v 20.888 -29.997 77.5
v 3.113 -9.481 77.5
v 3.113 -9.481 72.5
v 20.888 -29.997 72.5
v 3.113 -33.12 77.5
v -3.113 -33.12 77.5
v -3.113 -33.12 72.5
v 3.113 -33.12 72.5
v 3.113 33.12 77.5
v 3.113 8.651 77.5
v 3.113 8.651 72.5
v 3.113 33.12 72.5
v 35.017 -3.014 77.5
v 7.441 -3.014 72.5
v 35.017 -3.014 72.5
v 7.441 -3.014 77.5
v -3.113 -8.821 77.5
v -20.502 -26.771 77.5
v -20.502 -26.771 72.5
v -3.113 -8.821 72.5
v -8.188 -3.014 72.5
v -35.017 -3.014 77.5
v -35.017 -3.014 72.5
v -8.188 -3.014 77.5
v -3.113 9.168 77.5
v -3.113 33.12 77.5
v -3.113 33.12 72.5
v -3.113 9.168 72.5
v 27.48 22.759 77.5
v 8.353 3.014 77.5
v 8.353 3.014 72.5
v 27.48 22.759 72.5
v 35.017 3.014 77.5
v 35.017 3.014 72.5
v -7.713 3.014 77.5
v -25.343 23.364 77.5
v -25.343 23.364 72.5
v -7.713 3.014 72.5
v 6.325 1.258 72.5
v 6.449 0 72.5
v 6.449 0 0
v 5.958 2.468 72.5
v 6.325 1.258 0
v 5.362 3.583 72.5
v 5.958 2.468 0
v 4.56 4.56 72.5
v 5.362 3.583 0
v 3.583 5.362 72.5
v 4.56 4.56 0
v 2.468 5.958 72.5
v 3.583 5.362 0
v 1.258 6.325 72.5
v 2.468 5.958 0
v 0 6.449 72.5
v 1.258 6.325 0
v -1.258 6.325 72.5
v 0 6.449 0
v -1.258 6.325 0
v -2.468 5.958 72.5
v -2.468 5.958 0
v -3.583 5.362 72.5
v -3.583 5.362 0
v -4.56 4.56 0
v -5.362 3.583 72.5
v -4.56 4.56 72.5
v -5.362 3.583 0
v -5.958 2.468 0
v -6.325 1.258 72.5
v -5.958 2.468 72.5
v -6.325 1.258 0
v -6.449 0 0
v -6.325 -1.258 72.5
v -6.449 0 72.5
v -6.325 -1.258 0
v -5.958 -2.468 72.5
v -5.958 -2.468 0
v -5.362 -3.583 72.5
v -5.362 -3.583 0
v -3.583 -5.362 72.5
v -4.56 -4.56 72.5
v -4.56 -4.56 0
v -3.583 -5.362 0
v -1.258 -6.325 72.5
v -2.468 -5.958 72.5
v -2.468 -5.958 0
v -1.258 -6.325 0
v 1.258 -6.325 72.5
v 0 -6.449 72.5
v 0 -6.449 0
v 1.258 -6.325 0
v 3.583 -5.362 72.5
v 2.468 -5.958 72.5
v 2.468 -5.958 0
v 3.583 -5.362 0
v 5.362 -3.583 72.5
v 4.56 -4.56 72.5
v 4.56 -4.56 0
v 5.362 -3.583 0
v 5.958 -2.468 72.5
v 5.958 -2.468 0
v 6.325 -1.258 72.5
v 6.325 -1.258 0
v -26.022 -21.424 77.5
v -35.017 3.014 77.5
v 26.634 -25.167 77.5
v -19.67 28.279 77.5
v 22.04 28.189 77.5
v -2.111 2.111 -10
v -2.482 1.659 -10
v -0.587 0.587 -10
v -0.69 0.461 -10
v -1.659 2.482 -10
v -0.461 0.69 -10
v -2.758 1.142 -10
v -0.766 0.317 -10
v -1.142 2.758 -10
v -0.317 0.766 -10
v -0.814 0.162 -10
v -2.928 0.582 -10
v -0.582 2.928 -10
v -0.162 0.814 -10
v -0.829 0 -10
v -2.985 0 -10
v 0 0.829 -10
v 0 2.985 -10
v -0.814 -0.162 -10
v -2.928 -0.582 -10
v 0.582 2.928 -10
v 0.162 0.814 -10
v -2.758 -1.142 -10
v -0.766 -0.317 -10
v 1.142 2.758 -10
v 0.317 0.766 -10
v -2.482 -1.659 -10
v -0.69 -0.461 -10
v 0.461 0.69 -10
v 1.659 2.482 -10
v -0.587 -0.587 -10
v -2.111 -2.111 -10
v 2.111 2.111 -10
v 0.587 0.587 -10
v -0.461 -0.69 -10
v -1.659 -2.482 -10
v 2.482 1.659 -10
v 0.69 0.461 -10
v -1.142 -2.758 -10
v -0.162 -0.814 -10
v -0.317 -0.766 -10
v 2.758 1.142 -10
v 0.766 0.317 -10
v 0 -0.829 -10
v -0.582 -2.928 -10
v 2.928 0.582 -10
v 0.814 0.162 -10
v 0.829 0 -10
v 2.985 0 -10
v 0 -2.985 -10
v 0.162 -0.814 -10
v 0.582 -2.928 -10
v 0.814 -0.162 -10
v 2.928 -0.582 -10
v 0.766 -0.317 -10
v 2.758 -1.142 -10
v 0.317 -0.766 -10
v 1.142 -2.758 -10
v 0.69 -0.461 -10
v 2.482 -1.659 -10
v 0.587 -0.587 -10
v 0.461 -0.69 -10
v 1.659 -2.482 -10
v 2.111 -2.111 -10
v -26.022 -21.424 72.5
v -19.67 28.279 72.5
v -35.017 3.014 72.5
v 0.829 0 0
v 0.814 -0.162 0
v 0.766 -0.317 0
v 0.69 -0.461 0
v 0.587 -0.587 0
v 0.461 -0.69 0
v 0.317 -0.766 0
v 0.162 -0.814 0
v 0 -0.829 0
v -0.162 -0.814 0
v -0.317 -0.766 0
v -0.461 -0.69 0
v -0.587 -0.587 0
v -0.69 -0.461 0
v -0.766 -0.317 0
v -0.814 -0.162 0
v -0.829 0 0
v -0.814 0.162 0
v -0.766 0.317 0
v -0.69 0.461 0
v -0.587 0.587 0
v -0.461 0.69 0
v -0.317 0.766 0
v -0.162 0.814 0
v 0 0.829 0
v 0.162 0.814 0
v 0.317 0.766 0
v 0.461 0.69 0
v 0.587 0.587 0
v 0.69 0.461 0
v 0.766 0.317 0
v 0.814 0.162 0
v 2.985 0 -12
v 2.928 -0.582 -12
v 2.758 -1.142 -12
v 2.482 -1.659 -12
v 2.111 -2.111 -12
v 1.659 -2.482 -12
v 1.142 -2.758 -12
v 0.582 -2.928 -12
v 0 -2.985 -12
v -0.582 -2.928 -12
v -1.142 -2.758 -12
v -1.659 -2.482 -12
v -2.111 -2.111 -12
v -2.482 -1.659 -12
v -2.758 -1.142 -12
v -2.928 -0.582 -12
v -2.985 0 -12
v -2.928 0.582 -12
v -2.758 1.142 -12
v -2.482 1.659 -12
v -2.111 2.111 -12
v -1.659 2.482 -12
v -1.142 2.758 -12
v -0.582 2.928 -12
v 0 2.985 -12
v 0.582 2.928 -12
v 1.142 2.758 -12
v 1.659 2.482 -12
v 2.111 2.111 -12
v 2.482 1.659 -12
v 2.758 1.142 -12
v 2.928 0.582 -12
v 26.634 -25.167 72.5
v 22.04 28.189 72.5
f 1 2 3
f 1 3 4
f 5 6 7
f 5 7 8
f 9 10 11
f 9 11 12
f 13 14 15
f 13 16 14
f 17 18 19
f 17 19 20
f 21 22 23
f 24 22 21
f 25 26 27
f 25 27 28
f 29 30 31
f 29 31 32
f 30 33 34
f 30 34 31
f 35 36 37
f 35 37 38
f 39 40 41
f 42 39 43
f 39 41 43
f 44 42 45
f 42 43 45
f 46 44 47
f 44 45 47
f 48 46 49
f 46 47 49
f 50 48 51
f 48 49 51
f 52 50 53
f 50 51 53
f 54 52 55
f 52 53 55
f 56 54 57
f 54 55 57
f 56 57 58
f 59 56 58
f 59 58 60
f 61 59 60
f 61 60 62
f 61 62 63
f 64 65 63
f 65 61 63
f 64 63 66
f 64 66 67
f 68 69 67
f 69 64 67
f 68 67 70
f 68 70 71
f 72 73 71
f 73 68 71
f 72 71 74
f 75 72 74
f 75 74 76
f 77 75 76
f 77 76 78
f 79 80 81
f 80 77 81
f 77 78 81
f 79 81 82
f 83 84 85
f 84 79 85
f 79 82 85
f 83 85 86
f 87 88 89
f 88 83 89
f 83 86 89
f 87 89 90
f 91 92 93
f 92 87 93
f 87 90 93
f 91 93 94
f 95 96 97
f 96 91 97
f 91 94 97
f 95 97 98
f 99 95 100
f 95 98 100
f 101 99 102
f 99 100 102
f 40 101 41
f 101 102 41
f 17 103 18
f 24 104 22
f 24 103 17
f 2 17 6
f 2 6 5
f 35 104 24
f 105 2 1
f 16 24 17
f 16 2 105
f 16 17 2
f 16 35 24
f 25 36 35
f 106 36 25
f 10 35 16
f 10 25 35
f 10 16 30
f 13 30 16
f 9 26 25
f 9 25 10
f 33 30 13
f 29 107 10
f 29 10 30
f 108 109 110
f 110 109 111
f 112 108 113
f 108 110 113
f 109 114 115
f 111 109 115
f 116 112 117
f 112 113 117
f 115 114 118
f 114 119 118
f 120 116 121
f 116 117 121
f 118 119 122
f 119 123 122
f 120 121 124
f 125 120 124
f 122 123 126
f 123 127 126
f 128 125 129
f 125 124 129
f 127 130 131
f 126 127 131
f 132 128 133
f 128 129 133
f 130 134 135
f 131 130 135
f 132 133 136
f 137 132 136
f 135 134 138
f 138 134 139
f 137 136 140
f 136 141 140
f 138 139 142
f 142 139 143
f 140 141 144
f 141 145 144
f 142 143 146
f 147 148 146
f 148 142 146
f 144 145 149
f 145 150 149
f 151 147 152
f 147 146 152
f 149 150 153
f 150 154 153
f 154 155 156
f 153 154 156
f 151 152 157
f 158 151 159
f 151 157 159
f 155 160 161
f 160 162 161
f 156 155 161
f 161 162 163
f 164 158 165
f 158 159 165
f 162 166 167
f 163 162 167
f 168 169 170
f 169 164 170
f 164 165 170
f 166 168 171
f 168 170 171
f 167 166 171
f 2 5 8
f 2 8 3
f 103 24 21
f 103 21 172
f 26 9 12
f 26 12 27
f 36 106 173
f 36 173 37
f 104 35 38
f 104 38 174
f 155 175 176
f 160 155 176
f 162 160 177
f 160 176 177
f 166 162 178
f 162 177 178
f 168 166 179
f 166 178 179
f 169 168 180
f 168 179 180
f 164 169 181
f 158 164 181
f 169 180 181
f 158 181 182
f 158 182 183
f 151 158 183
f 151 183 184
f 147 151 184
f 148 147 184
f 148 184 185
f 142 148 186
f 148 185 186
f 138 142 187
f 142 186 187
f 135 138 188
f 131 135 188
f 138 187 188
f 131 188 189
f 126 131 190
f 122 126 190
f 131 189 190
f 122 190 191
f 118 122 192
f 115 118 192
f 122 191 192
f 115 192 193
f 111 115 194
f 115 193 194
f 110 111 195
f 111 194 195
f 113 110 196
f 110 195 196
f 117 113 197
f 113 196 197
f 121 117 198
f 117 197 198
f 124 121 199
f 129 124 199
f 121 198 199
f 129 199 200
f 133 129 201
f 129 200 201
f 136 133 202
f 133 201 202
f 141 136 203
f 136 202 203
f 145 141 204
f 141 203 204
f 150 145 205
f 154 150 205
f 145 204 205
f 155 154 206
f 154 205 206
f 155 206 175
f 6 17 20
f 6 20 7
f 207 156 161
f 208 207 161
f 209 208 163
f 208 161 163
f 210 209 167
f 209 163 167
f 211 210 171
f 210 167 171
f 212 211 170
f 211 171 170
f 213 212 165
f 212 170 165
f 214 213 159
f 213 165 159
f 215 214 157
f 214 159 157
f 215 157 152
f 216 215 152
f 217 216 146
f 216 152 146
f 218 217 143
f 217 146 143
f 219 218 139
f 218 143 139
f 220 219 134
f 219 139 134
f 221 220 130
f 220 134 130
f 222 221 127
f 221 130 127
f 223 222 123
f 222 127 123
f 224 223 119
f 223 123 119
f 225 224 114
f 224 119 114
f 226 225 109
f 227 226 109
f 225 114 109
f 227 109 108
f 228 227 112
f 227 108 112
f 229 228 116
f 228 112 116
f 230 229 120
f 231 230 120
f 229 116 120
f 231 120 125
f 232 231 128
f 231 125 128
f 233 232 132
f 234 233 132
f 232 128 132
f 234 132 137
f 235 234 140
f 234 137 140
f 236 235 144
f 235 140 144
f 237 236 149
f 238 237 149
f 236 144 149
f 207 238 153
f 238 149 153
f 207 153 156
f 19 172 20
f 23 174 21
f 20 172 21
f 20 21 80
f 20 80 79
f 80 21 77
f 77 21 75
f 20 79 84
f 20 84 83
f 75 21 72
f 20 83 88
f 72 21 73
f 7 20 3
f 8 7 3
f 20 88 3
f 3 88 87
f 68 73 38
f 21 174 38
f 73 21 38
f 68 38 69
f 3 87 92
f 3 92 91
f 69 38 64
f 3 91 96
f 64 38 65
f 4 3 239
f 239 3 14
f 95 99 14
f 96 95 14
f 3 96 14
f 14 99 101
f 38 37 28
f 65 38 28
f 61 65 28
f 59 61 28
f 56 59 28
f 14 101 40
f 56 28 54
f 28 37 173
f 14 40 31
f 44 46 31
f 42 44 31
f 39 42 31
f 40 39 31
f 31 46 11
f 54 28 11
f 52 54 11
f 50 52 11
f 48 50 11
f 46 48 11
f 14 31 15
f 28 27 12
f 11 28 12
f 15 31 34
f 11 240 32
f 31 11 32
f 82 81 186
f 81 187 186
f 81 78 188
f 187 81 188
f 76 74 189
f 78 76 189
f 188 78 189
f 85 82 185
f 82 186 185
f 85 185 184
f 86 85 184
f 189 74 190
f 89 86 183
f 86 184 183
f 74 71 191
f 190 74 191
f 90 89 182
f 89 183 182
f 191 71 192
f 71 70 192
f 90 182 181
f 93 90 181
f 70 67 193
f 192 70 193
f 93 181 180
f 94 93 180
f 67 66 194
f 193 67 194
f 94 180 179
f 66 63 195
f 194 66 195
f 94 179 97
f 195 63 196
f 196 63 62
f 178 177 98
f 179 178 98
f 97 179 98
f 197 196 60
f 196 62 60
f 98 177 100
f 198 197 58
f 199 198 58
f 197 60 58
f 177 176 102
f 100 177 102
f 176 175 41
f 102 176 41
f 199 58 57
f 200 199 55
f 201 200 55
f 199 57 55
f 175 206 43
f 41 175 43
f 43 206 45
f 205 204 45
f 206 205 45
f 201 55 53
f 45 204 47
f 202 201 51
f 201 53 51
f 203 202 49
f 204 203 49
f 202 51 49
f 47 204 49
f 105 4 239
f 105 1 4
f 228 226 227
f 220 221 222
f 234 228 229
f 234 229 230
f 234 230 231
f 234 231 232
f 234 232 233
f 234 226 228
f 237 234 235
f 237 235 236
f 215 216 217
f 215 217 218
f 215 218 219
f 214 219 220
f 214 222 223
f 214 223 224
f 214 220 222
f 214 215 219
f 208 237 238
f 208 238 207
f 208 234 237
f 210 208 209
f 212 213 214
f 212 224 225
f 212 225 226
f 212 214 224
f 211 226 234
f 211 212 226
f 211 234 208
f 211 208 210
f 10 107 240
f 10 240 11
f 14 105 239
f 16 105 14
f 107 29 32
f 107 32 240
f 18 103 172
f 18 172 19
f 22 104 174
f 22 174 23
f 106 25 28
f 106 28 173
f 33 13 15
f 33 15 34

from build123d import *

# Parameters (mm, degrees)
F0_R     = 6.448973
F1_DEPTH = 75
F3_DEPTH = 2.5
F4_R     = 0.829457
F5_DEPTH = 10
F6_R     = 2.985261
F7_DEPTH = 2


with BuildPart() as f1:
    # F0 (on Top) → F1 (new body)
    with BuildSketch(Plane.XY):
        Circle(F0_R)
    extrude(amount=F1_DEPTH)

    # F2 (on face) → F3 (join, symmetric)
    with BuildSketch(Plane.XY.offset(75)):
        Polygon((7.441463, -3.014468), (35.017251, -3.014468), (35.017251, 3.014468), (8.35262, 3.014468), (27.479934, 22.758793), (22.040198, 28.188686), (3.112997, 8.650931), (3.112997, 33.119855), (-3.112997, 33.119855), (-3.112997, 9.167791), (-19.670232, 28.278624), (-25.342984, 23.363868), (-7.712681, 3.014468), (-35.017251, 3.014468), (-35.017251, -3.014468), (-8.187858, -3.014468), (-26.021978, -21.423882), (-20.502207, -26.77116), (-3.112997, -8.821007), (-3.112997, -33.119855), (3.112997, -33.119855), (3.112997, -9.480839), (20.888046, -29.997309), (26.634359, -25.167458), align=None)
    extrude(amount=F3_DEPTH, both=True)

    # F4 (on face) → F5 (join)
    with BuildSketch(Plane(origin=(0, 0, 0), x_dir=(1, 0, 0), z_dir=(0, 0, -1))):
        Circle(F4_R)
    extrude(amount=F5_DEPTH)

    # F6 (on face) → F7 (join)
    with BuildSketch(Plane(origin=(0, 0, -10), x_dir=(1, 0, 0), z_dir=(0, 0, -1))):
        Circle(F6_R)
    extrude(amount=F7_DEPTH)


solid = f1.part
